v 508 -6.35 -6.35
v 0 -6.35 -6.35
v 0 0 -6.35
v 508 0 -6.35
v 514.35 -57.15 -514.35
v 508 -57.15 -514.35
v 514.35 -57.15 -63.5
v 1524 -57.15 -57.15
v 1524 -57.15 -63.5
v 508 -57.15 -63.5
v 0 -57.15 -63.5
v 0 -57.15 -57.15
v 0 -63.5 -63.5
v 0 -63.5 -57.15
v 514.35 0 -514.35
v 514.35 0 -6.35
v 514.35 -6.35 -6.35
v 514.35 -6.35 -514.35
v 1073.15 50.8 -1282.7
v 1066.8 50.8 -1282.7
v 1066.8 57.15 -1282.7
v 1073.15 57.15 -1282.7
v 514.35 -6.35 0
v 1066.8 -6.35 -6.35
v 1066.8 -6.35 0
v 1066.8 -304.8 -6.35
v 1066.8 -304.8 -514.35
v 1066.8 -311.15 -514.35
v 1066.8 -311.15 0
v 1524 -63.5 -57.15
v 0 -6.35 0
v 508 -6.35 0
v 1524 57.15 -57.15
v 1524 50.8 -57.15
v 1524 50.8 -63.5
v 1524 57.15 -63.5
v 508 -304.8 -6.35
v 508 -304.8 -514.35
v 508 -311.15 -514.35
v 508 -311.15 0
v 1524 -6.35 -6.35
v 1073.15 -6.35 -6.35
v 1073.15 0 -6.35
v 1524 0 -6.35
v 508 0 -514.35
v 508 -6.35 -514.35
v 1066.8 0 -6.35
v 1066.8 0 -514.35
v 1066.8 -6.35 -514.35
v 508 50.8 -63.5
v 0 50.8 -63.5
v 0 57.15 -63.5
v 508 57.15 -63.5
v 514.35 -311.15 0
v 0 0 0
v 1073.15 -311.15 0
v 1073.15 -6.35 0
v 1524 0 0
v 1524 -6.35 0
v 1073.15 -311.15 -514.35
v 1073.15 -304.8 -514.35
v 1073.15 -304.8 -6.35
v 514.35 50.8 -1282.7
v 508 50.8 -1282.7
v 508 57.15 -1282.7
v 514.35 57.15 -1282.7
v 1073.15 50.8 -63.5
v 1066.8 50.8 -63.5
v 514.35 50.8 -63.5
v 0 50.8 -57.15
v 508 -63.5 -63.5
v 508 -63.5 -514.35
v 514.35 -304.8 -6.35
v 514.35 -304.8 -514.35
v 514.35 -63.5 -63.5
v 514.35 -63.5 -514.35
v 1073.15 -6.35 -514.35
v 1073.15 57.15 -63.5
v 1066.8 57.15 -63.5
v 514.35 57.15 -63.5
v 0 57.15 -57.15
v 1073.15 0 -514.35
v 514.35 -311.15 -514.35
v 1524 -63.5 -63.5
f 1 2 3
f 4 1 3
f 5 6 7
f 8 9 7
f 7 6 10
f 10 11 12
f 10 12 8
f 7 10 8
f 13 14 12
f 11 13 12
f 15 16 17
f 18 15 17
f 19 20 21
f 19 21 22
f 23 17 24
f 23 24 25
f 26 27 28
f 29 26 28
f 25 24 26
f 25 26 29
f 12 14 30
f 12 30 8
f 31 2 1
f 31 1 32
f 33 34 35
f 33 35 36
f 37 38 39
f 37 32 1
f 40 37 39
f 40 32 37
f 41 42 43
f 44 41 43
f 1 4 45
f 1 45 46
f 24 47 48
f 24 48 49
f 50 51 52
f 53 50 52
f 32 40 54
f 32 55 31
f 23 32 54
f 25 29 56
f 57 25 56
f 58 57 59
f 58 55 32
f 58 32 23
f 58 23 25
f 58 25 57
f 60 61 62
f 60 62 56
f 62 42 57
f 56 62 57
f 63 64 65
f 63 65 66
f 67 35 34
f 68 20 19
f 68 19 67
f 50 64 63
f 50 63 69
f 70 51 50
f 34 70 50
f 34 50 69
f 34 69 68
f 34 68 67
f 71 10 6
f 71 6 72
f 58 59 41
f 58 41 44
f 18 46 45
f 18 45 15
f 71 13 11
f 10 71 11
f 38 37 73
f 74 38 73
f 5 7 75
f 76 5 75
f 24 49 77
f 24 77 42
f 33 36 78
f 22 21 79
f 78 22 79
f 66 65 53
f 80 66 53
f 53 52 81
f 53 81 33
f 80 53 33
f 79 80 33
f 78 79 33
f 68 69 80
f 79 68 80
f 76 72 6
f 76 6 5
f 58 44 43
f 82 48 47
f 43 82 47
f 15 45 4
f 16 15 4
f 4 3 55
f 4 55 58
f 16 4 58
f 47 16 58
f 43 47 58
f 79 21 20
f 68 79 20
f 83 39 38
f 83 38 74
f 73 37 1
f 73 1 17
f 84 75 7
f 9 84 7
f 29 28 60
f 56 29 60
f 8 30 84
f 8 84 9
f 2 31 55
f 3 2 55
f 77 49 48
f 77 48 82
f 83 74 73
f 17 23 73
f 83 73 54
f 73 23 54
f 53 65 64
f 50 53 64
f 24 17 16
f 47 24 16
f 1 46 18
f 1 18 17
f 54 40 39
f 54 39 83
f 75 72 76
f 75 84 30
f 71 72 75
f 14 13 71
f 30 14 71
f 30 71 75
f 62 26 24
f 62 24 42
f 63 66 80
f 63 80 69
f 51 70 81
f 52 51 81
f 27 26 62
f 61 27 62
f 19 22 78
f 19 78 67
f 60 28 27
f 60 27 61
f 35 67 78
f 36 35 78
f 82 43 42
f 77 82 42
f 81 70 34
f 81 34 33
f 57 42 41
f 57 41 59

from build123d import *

# Parameters (mm, degrees)
F0_W      = 6.35
F0_H      = 6.35
F1_DEPTH  = 1524
F2_W      = 6.35
F2_H      = 6.35
F3_DEPTH  = 508
F4_W      = 6.35
F4_H      = 6.35
F5_DEPTH  = 304.8
F6_W      = 6.35
F6_H      = 6.35
F7_DEPTH  = 508
F8_W      = 6.35
F8_H      = 6.35
F9_DEPTH  = 1524
F10_W     = 6.35
F10_H     = 6.35
F11_DEPTH = 450.85
F12_W     = 6.35
F12_H     = 6.35
F13_DEPTH = 1524
F14_W     = 6.35
F14_H     = 6.35
F15_DEPTH = 1219.2


with BuildPart() as f1:
    # F0 (on Right) → F1 (new body)
    with BuildSketch(Plane.YZ):
        with Locations((-3.175, -3.175)):
            Rectangle(F0_W, F0_H)
    extrude(amount=F1_DEPTH)

    # F2 (on face) → F3 (join)
    with BuildSketch(Plane(origin=(0, 0, -6.35), x_dir=(1, 0, 0), z_dir=(0, 0, -1))):
        with Locations((511.175, 3.175)):
            Rectangle(F2_W, F2_H)
        with Locations((1069.975, 3.175)):
            Rectangle(F2_W, F2_H)
    extrude(amount=F3_DEPTH)

    # F4 (on face) → F5 (join)
    with BuildSketch(Plane.XZ.offset(6.35)):
        with Locations((511.175, -3.175)):
            Rectangle(F4_W, F4_H)
        with Locations((1069.975, -3.175)):
            Rectangle(F4_W, F4_H)
    extrude(amount=F5_DEPTH)

    # F6 (on face) → F7 (join, through all)
    with BuildSketch(Plane(origin=(0, 0, -6.35), x_dir=(1, 0, 0), z_dir=(0, 0, -1))):
        with Locations((511.175, 307.975)):
            Rectangle(F6_W, F6_H)
        with Locations((1069.975, 307.975)):
            Rectangle(F6_W, F6_H)
    extrude(amount=F7_DEPTH)


with BuildPart() as f9:
    # F8 (on Right) → F9 (new body, through all)
    with BuildSketch(Plane.YZ):
        with Locations((-60.325, -60.325)):
            Rectangle(F8_W, F8_H)
    extrude(amount=F9_DEPTH)

    # F10 (on face) → F11 (join, through all)
    with BuildSketch(Plane(origin=(0, 0, -63.5), x_dir=(1, 0, 0), z_dir=(0, 0, -1))):
        with Locations((511.175, 60.325)):
            Rectangle(F10_W, F10_H)
    extrude(amount=F11_DEPTH)


with BuildPart() as f13:
    # F12 (on Right) → F13 (new body, through all)
    with BuildSketch(Plane.YZ):
        with Locations((53.975, -60.325)):
            Rectangle(F12_W, F12_H)
    extrude(amount=F13_DEPTH)

    # F14 (on face) → F15 (join)
    with BuildSketch(Plane(origin=(0, 0, -63.5), x_dir=(1, 0, 0), z_dir=(0, 0, -1))):
        with Locations((511.175, -53.975)):
            Rectangle(F14_W, F14_H)
        with Locations((1069.975, -53.975)):
            Rectangle(F14_W, F14_H)
    extrude(amount=F15_DEPTH)


solid = Compound([f1.part, f9.part, f13.part])
